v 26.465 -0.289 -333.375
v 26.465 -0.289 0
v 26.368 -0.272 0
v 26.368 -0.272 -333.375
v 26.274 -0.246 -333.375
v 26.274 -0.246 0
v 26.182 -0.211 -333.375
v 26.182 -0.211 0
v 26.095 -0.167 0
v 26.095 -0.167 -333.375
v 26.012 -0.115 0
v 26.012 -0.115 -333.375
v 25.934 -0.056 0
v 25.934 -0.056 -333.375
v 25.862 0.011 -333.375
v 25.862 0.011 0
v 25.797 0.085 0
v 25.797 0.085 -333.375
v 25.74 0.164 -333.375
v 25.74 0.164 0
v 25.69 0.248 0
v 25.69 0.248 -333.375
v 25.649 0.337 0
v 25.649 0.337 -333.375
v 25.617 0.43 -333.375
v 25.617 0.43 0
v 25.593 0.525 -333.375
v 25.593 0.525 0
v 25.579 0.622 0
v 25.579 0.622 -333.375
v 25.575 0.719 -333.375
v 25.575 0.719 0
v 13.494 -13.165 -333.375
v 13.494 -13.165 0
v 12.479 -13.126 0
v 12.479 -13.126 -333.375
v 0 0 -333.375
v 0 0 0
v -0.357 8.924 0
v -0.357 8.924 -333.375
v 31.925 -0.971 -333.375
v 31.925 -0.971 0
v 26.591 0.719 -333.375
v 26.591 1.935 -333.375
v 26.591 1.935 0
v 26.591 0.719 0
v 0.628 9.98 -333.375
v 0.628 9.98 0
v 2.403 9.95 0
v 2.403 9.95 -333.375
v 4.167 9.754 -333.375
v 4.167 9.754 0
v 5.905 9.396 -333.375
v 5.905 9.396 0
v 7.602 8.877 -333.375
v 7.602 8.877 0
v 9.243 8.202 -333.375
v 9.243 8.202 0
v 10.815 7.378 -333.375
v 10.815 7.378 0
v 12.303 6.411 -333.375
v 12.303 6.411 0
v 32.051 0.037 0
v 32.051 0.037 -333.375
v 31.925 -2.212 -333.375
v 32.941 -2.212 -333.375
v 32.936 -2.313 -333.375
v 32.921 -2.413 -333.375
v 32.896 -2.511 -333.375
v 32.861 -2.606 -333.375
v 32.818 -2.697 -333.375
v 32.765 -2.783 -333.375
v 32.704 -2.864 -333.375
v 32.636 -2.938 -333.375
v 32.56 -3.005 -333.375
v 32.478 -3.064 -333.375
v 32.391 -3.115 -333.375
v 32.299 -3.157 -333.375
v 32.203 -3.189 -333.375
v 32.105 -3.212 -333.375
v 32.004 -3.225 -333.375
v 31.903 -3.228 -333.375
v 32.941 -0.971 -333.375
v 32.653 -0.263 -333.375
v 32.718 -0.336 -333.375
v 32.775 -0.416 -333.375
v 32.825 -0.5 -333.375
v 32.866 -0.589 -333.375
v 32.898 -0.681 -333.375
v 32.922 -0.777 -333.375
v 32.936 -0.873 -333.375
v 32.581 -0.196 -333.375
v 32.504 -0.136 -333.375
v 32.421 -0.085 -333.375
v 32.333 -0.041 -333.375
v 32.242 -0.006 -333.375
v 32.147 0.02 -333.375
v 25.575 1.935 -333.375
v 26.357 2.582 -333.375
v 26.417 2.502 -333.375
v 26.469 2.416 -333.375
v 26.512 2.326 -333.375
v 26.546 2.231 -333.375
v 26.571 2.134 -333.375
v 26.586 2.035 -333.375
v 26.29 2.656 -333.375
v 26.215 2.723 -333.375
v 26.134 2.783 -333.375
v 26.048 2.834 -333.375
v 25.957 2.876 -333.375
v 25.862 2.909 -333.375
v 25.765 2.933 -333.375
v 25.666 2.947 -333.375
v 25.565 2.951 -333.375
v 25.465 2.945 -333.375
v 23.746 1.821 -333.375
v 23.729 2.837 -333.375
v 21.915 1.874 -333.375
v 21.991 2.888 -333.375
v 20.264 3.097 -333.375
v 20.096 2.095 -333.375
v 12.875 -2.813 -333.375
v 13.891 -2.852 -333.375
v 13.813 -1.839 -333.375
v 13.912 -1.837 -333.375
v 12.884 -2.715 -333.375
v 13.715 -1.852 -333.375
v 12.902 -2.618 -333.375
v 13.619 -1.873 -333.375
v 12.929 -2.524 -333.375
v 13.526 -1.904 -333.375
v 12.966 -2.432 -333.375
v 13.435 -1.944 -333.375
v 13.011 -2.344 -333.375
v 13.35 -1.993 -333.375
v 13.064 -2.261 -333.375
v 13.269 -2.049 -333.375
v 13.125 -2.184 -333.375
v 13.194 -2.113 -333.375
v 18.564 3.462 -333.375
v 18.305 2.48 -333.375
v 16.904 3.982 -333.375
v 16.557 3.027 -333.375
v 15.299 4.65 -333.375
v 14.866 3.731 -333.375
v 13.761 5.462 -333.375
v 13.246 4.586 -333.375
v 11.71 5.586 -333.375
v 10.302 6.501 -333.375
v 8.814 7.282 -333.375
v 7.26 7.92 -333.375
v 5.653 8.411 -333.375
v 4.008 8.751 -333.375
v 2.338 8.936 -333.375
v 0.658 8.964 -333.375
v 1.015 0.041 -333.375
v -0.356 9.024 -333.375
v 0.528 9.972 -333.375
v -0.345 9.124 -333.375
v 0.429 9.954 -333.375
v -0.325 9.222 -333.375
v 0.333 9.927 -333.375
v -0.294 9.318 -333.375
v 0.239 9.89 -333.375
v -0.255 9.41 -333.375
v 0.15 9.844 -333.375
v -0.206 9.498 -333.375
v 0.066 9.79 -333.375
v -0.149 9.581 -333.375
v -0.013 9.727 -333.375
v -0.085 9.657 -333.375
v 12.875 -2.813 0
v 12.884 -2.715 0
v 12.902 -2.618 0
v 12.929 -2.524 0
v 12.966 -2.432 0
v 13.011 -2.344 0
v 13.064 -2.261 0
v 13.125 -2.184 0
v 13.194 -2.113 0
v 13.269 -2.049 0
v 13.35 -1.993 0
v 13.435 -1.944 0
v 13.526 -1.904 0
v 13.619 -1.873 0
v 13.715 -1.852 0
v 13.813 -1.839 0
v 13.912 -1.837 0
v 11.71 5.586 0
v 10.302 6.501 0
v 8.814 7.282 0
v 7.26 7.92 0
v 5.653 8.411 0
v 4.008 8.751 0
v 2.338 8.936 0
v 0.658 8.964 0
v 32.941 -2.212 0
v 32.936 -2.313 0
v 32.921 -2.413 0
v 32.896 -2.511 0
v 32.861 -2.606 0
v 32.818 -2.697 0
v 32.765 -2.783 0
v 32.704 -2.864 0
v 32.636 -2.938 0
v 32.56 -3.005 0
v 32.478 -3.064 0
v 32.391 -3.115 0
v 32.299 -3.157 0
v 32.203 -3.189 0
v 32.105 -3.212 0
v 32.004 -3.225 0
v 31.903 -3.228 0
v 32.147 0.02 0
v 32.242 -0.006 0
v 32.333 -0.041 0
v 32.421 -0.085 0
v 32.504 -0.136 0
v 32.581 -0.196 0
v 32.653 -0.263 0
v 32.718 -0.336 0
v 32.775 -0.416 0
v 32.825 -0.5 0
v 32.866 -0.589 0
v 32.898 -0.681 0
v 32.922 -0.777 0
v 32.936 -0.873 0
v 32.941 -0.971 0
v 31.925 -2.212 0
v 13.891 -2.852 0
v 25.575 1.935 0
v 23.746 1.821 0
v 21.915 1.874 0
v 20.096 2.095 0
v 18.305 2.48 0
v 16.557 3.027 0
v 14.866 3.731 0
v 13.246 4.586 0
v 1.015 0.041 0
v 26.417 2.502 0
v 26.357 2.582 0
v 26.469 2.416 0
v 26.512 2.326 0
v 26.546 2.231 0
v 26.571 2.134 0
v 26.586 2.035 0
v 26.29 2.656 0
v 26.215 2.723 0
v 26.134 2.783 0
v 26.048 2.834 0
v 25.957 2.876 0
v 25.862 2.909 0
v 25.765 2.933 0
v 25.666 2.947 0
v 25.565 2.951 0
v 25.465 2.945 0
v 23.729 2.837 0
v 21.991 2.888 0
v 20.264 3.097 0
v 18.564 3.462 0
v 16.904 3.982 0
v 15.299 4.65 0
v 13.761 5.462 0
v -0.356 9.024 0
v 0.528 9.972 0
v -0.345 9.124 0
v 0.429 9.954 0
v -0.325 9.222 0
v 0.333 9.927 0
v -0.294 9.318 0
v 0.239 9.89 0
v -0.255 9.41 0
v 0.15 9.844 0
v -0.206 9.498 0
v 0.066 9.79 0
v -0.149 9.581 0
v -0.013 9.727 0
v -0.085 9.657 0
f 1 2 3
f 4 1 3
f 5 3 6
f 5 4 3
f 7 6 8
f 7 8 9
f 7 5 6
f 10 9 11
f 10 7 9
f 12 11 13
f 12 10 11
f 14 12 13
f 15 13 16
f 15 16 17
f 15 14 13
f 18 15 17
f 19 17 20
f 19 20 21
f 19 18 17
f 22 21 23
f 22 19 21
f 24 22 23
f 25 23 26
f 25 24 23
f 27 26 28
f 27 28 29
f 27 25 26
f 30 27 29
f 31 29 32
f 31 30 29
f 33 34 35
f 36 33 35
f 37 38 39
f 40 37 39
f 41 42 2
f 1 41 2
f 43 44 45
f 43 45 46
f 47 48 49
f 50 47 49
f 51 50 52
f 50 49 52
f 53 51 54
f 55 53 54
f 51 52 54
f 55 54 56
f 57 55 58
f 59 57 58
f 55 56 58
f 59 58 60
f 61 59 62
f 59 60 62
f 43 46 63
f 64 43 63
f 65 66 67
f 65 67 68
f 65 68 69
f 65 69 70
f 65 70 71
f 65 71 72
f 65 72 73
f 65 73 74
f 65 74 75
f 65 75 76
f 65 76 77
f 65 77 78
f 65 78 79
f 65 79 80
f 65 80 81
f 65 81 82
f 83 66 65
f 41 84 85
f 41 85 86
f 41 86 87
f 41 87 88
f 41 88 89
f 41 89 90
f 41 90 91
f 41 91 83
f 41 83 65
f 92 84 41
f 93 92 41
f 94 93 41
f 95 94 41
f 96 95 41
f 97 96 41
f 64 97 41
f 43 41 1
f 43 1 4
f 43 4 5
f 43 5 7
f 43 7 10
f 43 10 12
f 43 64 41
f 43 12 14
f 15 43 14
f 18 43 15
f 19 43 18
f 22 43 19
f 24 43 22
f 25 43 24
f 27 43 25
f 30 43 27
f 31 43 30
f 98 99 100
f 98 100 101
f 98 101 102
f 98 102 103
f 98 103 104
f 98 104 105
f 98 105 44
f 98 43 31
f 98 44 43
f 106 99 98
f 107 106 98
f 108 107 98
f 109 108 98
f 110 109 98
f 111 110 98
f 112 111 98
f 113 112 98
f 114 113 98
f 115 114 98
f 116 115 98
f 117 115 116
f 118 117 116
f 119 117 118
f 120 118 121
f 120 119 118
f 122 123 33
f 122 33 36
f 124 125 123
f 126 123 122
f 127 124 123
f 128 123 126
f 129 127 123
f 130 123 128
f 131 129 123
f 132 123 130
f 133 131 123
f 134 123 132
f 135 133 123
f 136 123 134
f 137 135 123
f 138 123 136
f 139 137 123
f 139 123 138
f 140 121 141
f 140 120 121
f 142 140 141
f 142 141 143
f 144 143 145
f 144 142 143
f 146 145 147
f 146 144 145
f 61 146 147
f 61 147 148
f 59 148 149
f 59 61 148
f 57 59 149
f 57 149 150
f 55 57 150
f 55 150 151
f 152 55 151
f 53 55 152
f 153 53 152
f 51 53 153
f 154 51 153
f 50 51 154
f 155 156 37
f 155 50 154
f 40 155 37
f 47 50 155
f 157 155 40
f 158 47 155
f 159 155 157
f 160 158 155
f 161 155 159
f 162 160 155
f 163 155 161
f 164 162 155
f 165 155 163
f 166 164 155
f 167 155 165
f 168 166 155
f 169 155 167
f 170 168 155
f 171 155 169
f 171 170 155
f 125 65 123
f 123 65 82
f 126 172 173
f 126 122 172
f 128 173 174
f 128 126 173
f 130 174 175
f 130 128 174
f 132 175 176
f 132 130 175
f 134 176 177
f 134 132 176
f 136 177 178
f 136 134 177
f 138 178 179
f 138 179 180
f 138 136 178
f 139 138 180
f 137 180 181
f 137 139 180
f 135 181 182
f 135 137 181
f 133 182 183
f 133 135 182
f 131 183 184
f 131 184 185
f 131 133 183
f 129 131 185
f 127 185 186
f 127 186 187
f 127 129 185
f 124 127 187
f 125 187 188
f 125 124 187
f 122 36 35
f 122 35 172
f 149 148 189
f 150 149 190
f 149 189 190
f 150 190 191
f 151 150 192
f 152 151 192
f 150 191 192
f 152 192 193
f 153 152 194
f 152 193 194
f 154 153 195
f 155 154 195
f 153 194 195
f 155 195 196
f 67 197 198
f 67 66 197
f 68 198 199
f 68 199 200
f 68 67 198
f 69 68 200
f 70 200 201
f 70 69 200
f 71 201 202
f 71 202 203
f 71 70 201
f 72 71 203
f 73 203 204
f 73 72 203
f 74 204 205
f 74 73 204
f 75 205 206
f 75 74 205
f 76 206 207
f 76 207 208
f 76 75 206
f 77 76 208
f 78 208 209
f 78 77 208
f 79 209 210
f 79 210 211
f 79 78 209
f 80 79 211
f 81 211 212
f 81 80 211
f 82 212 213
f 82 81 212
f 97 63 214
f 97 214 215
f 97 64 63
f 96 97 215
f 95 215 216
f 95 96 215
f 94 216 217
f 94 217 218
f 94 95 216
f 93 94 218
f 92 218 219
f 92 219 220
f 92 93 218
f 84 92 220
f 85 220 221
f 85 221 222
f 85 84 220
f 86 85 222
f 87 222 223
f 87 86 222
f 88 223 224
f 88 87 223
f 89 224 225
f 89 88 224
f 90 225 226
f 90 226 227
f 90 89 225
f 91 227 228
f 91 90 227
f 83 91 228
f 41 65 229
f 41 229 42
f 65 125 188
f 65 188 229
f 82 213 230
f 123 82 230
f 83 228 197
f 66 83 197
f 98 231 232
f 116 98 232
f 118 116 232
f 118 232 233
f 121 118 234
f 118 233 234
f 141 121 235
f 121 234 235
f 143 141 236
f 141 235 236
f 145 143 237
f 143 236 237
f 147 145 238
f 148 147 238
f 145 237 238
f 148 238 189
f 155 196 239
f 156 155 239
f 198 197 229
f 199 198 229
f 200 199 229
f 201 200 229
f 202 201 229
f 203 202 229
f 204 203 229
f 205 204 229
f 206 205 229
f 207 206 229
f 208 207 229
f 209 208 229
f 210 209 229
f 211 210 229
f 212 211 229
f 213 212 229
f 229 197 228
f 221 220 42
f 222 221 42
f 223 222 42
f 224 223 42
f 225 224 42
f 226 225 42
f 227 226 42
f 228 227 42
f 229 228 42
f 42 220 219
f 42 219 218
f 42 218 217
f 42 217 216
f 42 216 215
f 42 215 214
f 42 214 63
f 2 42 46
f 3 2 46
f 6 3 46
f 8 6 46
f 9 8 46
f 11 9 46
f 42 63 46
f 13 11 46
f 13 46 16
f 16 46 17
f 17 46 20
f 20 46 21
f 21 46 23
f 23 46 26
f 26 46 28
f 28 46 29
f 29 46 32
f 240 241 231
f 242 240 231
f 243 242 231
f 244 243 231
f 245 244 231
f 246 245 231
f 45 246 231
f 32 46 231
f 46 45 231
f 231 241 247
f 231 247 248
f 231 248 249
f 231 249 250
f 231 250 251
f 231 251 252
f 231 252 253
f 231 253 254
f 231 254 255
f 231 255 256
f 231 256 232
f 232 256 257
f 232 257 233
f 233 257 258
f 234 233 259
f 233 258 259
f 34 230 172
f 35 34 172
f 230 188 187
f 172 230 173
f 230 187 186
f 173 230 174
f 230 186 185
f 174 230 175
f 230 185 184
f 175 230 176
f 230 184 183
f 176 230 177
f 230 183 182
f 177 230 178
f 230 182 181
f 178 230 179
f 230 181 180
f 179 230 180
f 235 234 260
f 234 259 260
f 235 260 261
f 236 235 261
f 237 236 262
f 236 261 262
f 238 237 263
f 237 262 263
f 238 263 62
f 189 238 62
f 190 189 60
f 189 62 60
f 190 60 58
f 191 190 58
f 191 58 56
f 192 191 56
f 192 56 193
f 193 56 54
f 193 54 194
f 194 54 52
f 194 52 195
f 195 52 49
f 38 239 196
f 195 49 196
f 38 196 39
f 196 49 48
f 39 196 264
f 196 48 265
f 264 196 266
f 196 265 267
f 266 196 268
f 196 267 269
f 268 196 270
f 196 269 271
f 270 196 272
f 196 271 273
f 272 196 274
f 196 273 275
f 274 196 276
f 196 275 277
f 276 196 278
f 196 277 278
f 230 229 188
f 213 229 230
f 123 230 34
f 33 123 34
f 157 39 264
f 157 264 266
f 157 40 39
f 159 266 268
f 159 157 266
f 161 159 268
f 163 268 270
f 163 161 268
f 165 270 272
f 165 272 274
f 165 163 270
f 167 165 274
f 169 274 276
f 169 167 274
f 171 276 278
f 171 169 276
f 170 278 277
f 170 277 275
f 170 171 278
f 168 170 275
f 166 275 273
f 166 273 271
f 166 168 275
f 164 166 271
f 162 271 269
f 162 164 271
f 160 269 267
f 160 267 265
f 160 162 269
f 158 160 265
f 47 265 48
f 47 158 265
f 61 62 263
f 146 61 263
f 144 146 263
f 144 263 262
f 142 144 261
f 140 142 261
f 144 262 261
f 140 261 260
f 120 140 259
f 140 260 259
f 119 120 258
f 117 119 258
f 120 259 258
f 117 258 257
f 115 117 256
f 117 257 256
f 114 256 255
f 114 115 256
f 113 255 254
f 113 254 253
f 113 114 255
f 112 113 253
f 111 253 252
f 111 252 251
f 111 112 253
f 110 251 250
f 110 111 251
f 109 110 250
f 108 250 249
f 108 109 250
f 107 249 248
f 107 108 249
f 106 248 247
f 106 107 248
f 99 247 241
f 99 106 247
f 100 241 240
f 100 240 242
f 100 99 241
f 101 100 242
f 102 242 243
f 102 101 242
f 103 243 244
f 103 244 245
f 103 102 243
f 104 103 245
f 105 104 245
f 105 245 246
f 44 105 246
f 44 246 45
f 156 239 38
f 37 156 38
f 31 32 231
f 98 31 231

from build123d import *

# Parameters (mm, degrees)
EXTRUDE_THIN1_DEPTH = 333.375
FILLET1_R           = 1.016


with BuildPart() as part:
    # Sketch1 → Extrude-Thin1 (new body)
    with BuildSketch(Plane.XY):
        with BuildLine():
            Line((0, 0), (-0.396875, 9.921875))
            ThreePointArc((-0.396875, 9.921875), (6.266318546, 9.299504076), (12.303125, 6.411172093))
            ThreePointArc((12.303125, 6.411172093), (19.115525264, 3.32587731), (26.590625, 3.100654804))
            Line((26.590625, 3.100654804), (26.590625, 0.719404804))
            Line((26.590625, 0.719404804), (32.940625, -0.074345196))
            Line((32.940625, -0.074345196), (32.940625, -3.249345196))
            Line((32.940625, -3.249345196), (13.890625, -2.852470196))
            Line((13.890625, -2.852470196), (13.49375, -13.165191036))
            Line((13.49375, -13.165191036), (12.478501524, -13.126120189))
            Line((12.478501524, -13.126120189), (12.913764372, -1.815898471))
            Line((12.913764372, -1.815898471), (31.924625, -2.211958067))
            Line((31.924625, -2.211958067), (31.924625, -0.97125193))
            Line((31.924625, -0.97125193), (25.574625, -0.17750193))
            Line((25.574625, -0.17750193), (25.574625, 1.934694963))
            ThreePointArc((25.574625, 1.934694963), (18.305318895, 2.479849648), (11.710458333, 5.585943505))
            ThreePointArc((11.710458333, 5.585943505), (6.462301295, 8.184427992), (0.658241432, 8.964276082))
            Line((0.658241432, 8.964276082), (1.015188174, 0.040607527))
            Line((1.015188174, 0.040607527), (0, 0))
        make_face()
    extrude(amount=-EXTRUDE_THIN1_DEPTH)

    # Fillet1
    fillet1_edges = [part.edges().sort_by_distance(p)[0] for p in [
        (12.913764372, -1.815898471, -166.6875),
        (25.574625, -0.17750193, -166.6875),
        (-0.396875, 9.921875, -166.6875),
        (26.590625, 3.100654804, -166.6875),
        (32.940625, -0.074345196, -166.6875),
        (32.940625, -3.249345196, -166.6875),
    ]]
    fillet(fillet1_edges, radius=FILLET1_R)


solid = part.part
